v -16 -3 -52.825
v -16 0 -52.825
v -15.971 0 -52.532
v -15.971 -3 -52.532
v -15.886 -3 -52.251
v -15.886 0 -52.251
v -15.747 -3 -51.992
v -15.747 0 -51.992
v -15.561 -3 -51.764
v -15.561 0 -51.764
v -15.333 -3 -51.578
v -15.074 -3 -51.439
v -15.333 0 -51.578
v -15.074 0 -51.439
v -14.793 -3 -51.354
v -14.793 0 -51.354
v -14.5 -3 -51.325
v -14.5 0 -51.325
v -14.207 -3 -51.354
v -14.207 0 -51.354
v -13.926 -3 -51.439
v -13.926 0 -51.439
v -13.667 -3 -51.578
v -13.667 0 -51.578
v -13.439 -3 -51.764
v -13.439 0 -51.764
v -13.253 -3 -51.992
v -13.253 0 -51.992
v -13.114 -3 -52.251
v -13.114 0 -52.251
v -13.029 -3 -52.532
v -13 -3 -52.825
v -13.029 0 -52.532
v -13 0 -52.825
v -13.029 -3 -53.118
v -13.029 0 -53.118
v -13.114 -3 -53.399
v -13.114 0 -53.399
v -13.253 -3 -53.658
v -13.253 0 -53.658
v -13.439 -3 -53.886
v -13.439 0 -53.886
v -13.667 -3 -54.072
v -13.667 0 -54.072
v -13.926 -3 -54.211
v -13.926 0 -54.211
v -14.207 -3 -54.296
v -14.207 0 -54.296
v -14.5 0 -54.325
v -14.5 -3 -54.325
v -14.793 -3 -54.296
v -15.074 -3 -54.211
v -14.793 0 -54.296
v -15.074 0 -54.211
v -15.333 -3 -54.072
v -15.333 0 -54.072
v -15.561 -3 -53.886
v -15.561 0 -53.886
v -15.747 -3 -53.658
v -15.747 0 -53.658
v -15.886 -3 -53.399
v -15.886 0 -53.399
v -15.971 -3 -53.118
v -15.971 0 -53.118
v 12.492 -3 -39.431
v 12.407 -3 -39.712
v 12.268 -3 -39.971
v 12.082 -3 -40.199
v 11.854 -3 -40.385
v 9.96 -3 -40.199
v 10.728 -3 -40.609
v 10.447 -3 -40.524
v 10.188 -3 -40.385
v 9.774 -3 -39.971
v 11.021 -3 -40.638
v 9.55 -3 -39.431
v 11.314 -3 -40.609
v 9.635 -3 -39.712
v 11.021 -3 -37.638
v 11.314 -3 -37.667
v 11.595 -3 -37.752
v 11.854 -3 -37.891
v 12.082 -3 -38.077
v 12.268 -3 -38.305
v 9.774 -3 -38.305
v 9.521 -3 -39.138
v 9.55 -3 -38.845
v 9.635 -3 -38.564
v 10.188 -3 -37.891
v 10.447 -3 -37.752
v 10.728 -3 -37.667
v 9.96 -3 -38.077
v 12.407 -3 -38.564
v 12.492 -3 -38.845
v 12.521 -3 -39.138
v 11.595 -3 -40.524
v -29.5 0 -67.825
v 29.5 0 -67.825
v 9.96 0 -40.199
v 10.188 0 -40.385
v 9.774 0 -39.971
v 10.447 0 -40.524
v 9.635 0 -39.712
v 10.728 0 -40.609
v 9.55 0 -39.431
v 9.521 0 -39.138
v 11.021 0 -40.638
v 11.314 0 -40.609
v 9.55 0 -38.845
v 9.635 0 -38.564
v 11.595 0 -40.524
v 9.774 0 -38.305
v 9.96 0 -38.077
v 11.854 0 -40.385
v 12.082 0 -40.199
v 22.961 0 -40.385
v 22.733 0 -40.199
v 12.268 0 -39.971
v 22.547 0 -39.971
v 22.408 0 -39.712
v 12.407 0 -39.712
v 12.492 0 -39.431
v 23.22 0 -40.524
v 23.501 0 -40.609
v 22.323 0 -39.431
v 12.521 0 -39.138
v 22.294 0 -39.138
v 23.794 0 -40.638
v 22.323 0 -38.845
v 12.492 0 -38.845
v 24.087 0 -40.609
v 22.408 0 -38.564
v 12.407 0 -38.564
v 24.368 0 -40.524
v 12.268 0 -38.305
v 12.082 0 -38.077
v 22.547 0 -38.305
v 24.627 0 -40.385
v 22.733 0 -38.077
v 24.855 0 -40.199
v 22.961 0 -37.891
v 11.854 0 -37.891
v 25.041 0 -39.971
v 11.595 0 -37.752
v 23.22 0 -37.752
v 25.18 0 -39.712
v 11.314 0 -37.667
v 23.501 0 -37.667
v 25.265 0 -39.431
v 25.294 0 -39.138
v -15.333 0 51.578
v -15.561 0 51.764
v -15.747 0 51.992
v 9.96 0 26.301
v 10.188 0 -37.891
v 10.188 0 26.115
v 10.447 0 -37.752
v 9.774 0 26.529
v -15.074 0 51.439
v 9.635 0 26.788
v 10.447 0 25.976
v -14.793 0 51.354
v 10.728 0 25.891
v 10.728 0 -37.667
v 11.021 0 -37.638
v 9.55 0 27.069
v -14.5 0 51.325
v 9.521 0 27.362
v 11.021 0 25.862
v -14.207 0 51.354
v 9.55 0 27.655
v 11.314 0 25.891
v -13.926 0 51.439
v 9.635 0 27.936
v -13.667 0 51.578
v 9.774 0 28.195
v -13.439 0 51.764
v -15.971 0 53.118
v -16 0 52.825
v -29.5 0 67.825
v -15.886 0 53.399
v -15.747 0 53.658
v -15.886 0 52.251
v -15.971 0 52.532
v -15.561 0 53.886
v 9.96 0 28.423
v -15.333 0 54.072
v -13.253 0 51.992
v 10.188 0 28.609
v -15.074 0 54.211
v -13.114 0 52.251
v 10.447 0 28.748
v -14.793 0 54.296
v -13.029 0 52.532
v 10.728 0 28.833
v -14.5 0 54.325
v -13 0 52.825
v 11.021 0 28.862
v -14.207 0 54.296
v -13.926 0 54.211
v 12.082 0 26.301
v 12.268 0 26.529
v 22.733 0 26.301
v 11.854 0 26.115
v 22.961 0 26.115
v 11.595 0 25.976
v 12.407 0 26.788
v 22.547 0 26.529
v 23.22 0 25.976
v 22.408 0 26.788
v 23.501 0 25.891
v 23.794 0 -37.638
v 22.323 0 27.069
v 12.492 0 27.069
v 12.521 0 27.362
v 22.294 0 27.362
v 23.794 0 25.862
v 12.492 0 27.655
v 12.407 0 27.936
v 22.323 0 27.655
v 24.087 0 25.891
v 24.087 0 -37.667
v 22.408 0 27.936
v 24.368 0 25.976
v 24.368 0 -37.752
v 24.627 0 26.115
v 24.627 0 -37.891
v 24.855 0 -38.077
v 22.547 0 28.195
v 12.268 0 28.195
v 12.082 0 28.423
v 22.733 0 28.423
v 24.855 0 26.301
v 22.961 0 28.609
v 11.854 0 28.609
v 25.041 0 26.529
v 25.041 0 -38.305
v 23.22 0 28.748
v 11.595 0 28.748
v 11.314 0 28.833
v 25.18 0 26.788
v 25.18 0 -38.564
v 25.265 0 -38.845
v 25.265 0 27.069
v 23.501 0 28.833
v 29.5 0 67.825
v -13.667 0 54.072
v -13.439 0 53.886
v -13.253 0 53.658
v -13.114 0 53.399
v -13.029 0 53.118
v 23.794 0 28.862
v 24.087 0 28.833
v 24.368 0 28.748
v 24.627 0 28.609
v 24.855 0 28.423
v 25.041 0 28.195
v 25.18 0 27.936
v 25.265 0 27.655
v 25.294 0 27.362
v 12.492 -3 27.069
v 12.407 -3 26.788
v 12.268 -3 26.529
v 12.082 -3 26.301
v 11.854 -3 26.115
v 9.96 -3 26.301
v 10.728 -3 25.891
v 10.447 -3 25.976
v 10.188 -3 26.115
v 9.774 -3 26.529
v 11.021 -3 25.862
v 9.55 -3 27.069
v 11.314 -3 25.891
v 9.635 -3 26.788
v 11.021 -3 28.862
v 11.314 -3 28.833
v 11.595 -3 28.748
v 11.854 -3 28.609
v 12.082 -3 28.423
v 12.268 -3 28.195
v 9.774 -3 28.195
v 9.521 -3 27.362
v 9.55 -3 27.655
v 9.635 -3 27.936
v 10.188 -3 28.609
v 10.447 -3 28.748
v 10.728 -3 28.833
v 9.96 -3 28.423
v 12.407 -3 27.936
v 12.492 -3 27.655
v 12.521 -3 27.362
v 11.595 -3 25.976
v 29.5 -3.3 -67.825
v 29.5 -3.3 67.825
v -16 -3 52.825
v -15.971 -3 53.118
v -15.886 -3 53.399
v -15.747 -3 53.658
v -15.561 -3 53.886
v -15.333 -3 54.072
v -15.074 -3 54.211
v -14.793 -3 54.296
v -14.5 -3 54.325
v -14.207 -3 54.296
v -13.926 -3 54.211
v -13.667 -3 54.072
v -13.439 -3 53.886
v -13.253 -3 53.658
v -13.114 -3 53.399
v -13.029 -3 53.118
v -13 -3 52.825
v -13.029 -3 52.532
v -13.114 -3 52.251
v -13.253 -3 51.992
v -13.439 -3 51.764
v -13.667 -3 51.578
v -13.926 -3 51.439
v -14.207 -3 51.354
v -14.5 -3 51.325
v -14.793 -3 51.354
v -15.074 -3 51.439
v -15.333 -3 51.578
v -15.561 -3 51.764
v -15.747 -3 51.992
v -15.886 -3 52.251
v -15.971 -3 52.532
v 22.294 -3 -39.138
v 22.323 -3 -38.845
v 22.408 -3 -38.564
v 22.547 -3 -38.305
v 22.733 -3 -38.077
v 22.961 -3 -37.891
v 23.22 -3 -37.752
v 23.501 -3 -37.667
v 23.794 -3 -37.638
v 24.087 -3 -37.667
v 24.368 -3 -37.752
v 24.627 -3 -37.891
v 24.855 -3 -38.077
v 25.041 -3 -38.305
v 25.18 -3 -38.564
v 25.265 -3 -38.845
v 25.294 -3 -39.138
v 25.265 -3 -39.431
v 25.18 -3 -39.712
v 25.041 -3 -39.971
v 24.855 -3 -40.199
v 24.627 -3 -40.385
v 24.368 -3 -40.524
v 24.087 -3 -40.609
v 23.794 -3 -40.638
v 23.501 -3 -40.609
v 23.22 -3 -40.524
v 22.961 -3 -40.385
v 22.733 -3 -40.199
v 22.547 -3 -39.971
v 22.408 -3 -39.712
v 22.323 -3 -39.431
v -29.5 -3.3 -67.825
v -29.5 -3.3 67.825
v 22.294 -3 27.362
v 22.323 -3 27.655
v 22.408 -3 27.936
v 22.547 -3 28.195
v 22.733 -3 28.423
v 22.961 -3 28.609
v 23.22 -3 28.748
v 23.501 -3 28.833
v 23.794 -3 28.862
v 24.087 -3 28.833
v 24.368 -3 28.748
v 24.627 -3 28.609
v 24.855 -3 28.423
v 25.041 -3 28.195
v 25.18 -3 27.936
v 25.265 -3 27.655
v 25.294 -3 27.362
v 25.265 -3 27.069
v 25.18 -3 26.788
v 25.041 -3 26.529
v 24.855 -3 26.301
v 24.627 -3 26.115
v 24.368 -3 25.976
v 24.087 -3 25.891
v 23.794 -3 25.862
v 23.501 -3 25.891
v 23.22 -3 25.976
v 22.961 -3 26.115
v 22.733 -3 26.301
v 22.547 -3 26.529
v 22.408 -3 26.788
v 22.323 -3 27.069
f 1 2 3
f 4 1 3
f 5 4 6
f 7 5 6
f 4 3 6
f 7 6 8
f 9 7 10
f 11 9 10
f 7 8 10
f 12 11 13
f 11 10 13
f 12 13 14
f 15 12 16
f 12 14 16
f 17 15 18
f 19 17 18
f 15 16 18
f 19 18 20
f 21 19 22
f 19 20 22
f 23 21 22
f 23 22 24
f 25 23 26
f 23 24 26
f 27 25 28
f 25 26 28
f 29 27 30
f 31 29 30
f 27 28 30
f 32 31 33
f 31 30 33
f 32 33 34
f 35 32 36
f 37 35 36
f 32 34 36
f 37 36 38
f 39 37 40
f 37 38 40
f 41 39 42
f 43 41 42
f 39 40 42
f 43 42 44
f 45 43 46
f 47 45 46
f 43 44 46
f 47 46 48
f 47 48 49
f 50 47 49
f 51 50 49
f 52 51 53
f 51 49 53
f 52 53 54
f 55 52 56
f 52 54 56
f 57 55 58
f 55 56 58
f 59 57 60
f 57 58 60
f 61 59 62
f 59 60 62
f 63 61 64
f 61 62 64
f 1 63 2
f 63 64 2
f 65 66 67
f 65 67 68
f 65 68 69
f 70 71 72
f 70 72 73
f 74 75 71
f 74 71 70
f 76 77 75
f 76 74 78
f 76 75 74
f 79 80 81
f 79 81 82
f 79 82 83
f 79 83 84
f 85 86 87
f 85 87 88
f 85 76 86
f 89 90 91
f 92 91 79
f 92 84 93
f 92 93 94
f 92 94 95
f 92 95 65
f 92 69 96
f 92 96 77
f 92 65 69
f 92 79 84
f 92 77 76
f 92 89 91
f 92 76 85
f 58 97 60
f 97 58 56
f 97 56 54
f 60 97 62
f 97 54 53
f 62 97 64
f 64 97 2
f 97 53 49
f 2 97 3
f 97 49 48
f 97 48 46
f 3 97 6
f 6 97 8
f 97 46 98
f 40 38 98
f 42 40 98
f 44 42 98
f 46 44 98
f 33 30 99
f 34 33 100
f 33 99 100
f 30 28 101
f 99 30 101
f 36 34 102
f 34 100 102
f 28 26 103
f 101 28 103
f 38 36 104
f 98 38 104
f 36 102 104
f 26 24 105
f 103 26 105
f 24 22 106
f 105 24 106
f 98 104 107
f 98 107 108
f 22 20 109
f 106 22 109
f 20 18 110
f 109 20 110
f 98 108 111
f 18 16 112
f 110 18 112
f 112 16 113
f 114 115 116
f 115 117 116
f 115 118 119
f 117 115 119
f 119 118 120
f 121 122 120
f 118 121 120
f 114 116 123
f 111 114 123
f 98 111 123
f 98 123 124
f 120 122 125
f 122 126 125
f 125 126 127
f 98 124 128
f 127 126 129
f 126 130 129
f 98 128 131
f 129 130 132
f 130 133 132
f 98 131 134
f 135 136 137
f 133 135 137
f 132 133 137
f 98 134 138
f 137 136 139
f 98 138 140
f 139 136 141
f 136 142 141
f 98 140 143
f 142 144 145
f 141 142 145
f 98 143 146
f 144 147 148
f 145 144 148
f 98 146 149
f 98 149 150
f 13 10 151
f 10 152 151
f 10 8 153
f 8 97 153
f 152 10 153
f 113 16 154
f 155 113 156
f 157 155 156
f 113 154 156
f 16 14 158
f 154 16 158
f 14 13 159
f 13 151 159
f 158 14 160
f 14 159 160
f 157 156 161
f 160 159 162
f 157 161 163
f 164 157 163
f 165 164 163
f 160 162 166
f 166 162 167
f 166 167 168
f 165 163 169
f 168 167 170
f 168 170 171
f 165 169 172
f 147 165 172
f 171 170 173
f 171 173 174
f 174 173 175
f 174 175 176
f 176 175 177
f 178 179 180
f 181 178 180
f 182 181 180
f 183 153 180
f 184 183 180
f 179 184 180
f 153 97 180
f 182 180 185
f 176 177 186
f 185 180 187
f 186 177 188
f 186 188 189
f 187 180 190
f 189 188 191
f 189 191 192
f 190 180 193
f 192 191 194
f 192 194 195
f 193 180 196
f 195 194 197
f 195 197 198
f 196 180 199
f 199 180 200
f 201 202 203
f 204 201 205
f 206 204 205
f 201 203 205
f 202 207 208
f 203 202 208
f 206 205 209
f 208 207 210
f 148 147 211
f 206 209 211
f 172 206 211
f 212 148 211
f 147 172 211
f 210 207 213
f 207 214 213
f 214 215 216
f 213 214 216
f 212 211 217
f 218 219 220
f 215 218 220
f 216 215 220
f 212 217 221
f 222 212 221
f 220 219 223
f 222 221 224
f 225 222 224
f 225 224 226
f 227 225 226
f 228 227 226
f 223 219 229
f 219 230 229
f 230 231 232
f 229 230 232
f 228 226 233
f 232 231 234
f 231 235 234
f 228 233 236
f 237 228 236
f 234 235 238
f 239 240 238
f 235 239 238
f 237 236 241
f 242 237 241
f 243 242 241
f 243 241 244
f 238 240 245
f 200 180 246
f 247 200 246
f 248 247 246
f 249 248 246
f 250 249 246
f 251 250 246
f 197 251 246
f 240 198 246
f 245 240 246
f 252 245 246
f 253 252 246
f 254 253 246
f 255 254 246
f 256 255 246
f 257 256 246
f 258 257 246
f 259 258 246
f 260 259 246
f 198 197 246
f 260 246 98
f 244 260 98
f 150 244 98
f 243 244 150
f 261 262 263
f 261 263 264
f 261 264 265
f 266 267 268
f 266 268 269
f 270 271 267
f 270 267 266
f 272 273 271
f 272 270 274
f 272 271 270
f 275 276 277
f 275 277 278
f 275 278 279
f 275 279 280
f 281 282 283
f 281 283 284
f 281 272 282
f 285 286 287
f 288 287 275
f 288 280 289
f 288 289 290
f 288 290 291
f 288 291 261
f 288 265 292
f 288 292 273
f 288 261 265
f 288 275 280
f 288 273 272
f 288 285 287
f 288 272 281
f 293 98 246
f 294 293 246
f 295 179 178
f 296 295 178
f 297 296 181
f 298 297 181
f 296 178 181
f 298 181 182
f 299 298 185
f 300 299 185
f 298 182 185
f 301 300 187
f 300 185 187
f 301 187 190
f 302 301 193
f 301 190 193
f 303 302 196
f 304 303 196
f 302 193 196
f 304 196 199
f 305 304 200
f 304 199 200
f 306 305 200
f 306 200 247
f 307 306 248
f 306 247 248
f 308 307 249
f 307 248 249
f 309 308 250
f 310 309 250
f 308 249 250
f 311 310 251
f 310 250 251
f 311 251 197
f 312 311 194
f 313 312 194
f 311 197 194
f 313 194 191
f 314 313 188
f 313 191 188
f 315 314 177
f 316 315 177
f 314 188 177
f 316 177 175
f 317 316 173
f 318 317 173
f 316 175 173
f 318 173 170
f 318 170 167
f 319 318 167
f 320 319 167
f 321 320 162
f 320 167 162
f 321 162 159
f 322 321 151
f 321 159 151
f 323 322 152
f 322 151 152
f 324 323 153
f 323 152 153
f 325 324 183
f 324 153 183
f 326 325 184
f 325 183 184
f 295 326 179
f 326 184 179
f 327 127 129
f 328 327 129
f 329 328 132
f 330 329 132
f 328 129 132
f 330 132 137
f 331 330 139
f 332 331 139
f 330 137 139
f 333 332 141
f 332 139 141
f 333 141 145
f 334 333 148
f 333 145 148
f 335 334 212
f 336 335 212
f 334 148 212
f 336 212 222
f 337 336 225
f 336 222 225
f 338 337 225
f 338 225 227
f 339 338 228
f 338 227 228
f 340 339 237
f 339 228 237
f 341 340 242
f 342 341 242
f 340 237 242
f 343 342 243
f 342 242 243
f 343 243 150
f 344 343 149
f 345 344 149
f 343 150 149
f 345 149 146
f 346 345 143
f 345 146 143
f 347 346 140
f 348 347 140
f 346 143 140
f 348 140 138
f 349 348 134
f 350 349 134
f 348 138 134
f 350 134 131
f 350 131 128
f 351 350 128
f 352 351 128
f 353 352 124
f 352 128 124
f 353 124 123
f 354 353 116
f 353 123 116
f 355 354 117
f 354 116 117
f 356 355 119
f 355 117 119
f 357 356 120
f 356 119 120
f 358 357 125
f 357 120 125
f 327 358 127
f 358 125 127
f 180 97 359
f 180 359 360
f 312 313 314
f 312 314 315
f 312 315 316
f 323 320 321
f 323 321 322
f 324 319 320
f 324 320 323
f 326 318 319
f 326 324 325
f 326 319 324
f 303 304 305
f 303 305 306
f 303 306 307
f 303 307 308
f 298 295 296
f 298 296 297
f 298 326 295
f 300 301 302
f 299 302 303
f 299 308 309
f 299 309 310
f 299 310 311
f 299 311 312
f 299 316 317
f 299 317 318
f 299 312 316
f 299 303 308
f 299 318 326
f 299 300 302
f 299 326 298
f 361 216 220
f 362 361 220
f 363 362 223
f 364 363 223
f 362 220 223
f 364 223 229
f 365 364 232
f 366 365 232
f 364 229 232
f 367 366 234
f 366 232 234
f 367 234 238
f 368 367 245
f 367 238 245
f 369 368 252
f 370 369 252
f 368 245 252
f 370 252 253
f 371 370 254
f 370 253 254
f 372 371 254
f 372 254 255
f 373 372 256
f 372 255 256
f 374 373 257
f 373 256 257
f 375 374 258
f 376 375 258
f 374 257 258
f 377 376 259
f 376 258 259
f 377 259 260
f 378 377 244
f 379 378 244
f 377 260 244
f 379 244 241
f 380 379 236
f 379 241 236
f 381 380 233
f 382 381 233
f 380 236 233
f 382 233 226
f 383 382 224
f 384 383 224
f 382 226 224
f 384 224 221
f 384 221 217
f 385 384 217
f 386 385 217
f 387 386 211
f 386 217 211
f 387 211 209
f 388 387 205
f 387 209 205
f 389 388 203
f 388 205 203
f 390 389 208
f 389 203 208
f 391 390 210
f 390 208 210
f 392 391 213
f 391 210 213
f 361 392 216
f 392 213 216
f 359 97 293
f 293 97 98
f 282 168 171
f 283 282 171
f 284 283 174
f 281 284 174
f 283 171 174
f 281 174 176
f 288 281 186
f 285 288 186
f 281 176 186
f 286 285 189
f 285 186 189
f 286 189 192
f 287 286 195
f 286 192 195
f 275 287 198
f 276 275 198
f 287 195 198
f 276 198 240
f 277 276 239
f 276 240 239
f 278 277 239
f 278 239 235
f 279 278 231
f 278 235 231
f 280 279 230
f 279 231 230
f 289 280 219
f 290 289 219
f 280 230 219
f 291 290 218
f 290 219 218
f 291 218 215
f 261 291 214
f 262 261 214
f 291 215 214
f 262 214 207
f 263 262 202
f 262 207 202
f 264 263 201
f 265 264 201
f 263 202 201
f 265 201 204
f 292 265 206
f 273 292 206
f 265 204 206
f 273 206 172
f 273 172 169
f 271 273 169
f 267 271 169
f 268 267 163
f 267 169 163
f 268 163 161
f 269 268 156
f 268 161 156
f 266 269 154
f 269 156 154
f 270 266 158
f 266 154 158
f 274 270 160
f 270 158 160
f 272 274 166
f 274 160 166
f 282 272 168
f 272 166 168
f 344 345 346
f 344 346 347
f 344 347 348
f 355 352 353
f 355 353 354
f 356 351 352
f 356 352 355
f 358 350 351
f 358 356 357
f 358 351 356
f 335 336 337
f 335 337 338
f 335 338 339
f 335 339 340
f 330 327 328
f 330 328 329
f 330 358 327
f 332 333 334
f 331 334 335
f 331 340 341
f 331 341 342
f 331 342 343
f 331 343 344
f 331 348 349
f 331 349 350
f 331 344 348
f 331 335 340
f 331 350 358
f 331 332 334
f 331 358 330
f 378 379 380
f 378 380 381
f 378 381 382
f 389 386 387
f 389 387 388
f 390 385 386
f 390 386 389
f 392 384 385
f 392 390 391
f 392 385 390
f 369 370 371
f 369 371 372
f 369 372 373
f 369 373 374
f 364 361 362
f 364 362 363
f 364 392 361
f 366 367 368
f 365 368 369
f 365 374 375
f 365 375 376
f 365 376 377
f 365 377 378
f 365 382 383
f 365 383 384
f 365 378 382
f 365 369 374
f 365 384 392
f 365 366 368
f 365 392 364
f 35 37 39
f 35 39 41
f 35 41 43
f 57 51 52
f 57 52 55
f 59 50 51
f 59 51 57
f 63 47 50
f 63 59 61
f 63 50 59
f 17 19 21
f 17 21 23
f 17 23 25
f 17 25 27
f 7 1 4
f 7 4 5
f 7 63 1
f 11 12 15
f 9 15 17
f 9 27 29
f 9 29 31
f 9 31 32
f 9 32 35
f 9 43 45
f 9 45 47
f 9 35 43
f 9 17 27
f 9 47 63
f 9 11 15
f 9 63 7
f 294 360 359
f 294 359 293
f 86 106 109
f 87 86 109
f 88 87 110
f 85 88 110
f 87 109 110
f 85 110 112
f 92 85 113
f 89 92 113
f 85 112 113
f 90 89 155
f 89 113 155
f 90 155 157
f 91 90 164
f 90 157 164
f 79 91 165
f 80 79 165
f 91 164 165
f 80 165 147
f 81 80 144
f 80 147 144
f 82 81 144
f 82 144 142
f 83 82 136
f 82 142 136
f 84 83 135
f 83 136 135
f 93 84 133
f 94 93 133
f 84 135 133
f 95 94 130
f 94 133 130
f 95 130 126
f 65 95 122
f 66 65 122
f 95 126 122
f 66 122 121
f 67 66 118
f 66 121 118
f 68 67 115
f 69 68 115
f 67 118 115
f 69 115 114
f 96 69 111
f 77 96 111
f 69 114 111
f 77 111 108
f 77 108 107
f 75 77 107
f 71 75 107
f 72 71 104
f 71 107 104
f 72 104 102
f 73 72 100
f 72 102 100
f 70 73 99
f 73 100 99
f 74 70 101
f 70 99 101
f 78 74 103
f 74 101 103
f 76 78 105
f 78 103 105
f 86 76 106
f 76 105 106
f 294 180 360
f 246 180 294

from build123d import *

# Parameters (mm, degrees)
F0_W     = 59
F0_H     = 135.65
F1_DEPTH = 3.3
F2_R     = 1.5
F3_DEPTH = 3
F4_R     = 1.5
F5_DEPTH = 3


with BuildPart() as f1:
    # F0 (on Front) → F1 (new body)
    with BuildSketch(Plane.XZ):
        Rectangle(F0_W, F0_H)
    extrude(amount=F1_DEPTH)

    # F2 (on face) → F3 (cut)
    with BuildSketch(Plane(origin=(0, 0, 0), x_dir=(-1, 0, 0), z_dir=(0, 1, 0))):
        with Locations((14.5, 52.825)):
            Circle(F2_R)
        with Locations((14.5, -52.825)):
            Circle(F2_R)
    extrude(amount=-F3_DEPTH, mode=Mode.SUBTRACT)

    # F4 (on face) → F5 (cut)
    with BuildSketch(Plane(origin=(0, 0, 0), x_dir=(-1, 0, 0), z_dir=(0, 1, 0))):
        with Locations((-23.794, 27.362)):
            Circle(F4_R)
        with Locations((-11.021, 27.362)):
            Circle(F4_R)
        with Locations((-23.794, -39.138)):
            Circle(F4_R)
        with Locations((-11.021, -39.138)):
            Circle(F4_R)
    extrude(amount=-F5_DEPTH, mode=Mode.SUBTRACT)


solid = f1.part
